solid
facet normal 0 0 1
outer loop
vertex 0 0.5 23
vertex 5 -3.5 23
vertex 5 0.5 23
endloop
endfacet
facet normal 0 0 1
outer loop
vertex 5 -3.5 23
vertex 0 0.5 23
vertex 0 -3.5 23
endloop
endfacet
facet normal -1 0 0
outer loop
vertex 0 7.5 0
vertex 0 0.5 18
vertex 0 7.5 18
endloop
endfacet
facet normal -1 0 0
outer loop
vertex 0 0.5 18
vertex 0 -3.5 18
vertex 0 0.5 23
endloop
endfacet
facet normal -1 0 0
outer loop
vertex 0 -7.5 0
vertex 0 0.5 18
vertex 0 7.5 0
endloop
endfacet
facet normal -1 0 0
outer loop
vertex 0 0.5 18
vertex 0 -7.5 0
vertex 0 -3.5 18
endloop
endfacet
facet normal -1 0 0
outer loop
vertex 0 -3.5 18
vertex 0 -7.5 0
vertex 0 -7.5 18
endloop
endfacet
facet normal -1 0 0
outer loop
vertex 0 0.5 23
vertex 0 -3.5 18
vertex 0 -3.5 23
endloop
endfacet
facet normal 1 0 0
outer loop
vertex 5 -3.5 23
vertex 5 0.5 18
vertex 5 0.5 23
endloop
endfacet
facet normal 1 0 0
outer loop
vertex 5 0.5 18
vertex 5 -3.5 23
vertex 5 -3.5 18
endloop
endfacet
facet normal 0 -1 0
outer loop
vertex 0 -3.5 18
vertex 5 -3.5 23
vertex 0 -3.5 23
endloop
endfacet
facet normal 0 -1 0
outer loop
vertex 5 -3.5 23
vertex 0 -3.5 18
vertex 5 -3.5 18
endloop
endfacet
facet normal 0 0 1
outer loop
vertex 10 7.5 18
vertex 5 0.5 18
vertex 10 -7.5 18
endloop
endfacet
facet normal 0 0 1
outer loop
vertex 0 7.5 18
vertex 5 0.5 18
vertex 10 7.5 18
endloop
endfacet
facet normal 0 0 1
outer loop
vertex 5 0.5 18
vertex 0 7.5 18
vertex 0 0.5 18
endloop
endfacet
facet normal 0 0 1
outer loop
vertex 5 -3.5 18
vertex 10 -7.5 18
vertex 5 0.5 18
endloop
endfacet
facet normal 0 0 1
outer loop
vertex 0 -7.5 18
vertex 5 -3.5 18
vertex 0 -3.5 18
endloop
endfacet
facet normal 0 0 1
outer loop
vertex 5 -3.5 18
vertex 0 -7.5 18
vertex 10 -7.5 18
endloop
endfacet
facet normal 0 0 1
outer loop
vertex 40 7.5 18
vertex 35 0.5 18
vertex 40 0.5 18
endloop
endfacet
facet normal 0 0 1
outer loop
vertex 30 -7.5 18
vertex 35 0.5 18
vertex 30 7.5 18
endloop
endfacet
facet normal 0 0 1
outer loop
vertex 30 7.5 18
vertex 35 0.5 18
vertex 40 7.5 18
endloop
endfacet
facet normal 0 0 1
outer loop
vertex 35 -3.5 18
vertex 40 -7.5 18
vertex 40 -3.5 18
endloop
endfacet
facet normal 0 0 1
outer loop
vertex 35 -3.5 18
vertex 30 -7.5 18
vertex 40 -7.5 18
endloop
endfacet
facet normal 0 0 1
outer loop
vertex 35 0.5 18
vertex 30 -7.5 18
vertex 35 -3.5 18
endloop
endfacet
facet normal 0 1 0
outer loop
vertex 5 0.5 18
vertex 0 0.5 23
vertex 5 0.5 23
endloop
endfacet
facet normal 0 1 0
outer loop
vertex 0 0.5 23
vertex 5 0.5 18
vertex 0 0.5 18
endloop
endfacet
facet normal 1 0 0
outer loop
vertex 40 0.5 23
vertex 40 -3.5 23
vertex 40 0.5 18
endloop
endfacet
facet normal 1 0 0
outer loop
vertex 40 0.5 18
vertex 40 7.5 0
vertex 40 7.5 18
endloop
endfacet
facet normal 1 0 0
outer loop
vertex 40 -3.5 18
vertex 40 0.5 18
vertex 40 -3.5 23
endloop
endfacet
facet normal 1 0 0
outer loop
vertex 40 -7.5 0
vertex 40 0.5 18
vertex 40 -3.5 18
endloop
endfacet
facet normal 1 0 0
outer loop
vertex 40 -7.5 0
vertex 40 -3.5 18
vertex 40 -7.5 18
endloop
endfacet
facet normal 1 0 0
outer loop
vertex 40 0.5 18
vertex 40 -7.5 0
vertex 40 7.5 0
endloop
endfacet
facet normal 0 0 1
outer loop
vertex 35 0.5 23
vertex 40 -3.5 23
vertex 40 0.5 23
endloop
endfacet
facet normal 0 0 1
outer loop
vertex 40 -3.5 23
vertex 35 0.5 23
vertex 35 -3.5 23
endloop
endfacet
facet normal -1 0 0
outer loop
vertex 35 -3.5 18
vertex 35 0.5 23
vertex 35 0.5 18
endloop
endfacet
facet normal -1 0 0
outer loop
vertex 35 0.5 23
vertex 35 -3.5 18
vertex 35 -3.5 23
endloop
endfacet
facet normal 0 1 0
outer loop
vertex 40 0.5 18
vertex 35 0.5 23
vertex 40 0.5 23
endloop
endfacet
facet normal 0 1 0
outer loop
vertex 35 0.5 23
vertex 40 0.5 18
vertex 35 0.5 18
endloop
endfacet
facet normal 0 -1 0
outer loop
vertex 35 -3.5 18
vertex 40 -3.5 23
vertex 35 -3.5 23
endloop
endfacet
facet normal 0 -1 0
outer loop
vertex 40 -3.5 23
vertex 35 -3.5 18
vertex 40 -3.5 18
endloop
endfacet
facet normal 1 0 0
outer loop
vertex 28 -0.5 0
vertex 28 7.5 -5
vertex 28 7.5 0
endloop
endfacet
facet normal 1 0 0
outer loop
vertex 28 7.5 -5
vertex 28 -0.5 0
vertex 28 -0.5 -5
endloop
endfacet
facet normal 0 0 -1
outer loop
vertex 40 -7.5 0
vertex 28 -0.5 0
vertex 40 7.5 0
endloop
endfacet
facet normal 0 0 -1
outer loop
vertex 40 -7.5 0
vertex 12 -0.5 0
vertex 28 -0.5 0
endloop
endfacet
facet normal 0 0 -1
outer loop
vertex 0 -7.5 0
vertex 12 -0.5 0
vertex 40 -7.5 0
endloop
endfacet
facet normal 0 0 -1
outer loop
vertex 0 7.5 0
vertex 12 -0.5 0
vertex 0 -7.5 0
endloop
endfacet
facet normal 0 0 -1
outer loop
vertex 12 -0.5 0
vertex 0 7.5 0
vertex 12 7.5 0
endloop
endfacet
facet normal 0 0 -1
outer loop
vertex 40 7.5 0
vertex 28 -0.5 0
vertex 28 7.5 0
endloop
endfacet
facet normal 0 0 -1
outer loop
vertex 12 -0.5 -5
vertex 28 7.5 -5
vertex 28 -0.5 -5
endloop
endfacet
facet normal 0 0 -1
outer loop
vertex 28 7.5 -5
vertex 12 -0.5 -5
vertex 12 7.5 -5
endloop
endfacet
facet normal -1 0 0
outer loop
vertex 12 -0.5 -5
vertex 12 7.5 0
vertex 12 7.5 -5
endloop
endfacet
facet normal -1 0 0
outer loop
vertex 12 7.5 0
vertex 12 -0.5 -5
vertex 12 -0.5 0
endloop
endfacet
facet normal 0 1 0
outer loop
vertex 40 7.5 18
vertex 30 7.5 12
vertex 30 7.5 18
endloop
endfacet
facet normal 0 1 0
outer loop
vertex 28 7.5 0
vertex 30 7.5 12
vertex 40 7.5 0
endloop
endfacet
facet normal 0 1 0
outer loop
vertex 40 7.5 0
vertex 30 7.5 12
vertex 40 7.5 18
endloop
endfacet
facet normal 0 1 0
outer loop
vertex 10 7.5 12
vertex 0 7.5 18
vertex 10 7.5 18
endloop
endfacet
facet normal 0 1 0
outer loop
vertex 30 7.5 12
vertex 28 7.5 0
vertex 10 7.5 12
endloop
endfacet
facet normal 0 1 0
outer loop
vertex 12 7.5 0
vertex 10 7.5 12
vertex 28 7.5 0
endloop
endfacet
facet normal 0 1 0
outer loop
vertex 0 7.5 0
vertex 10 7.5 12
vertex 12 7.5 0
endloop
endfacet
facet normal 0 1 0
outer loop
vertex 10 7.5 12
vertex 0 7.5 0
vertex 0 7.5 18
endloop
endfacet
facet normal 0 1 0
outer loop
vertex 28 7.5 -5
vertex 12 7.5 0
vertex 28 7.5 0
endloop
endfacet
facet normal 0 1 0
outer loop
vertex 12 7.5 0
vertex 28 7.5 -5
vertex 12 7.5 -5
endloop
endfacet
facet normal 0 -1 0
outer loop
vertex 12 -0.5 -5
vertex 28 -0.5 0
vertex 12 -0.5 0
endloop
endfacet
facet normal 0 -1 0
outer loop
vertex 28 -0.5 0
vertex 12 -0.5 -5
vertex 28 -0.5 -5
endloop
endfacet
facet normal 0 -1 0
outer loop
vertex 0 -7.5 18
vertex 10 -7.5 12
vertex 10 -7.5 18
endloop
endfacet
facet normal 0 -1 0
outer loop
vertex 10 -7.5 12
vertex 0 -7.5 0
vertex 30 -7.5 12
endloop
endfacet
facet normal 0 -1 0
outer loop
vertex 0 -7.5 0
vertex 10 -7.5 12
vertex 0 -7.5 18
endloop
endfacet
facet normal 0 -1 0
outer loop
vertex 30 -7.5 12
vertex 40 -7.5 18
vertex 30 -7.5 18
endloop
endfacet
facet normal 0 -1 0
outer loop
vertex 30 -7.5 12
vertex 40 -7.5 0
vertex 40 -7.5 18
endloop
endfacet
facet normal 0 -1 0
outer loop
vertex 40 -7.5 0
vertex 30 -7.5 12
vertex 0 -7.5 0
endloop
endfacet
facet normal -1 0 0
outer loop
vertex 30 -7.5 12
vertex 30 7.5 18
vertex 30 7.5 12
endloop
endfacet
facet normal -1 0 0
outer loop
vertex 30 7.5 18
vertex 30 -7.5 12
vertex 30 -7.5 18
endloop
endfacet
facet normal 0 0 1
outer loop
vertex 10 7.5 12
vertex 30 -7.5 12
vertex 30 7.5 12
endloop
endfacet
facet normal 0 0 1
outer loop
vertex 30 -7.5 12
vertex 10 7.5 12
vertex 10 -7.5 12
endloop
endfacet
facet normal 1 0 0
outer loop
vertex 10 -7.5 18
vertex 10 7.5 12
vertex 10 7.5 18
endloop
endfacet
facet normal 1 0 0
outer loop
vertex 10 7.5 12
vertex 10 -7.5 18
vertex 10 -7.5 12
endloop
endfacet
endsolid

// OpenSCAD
include <../../lib/relativity.scad> // https://github.com/davidson16807/relativity.scad

width=15;
height=18;

module A() {
differed("cut", "not(cut)")
  box([60, width, height], anchor=bottom) {
    align(bottom) box([30, width+1, 12], anchor=bottom, $class="cut");
    mirrored(x) align([1,-1,1]) translated(4*y) box([5,4,5], anchor=[1,-1,-1]);
  }
}

module B() {
differed("cut", "not(cut)")
  box([40, width, height], anchor=bottom) {
    align([0,1,-1]) box([16,8,5], anchor=[0,1,1]);
    align(top) box([20, width+1, 6], anchor=top, $class="cut");
    mirrored(x) align([1,-1,1]) translated(4*y) box([5,4,5], anchor=[1,-1,-1]);
  }
}

// translated(-40*x) A();
translated(20*x) B();
